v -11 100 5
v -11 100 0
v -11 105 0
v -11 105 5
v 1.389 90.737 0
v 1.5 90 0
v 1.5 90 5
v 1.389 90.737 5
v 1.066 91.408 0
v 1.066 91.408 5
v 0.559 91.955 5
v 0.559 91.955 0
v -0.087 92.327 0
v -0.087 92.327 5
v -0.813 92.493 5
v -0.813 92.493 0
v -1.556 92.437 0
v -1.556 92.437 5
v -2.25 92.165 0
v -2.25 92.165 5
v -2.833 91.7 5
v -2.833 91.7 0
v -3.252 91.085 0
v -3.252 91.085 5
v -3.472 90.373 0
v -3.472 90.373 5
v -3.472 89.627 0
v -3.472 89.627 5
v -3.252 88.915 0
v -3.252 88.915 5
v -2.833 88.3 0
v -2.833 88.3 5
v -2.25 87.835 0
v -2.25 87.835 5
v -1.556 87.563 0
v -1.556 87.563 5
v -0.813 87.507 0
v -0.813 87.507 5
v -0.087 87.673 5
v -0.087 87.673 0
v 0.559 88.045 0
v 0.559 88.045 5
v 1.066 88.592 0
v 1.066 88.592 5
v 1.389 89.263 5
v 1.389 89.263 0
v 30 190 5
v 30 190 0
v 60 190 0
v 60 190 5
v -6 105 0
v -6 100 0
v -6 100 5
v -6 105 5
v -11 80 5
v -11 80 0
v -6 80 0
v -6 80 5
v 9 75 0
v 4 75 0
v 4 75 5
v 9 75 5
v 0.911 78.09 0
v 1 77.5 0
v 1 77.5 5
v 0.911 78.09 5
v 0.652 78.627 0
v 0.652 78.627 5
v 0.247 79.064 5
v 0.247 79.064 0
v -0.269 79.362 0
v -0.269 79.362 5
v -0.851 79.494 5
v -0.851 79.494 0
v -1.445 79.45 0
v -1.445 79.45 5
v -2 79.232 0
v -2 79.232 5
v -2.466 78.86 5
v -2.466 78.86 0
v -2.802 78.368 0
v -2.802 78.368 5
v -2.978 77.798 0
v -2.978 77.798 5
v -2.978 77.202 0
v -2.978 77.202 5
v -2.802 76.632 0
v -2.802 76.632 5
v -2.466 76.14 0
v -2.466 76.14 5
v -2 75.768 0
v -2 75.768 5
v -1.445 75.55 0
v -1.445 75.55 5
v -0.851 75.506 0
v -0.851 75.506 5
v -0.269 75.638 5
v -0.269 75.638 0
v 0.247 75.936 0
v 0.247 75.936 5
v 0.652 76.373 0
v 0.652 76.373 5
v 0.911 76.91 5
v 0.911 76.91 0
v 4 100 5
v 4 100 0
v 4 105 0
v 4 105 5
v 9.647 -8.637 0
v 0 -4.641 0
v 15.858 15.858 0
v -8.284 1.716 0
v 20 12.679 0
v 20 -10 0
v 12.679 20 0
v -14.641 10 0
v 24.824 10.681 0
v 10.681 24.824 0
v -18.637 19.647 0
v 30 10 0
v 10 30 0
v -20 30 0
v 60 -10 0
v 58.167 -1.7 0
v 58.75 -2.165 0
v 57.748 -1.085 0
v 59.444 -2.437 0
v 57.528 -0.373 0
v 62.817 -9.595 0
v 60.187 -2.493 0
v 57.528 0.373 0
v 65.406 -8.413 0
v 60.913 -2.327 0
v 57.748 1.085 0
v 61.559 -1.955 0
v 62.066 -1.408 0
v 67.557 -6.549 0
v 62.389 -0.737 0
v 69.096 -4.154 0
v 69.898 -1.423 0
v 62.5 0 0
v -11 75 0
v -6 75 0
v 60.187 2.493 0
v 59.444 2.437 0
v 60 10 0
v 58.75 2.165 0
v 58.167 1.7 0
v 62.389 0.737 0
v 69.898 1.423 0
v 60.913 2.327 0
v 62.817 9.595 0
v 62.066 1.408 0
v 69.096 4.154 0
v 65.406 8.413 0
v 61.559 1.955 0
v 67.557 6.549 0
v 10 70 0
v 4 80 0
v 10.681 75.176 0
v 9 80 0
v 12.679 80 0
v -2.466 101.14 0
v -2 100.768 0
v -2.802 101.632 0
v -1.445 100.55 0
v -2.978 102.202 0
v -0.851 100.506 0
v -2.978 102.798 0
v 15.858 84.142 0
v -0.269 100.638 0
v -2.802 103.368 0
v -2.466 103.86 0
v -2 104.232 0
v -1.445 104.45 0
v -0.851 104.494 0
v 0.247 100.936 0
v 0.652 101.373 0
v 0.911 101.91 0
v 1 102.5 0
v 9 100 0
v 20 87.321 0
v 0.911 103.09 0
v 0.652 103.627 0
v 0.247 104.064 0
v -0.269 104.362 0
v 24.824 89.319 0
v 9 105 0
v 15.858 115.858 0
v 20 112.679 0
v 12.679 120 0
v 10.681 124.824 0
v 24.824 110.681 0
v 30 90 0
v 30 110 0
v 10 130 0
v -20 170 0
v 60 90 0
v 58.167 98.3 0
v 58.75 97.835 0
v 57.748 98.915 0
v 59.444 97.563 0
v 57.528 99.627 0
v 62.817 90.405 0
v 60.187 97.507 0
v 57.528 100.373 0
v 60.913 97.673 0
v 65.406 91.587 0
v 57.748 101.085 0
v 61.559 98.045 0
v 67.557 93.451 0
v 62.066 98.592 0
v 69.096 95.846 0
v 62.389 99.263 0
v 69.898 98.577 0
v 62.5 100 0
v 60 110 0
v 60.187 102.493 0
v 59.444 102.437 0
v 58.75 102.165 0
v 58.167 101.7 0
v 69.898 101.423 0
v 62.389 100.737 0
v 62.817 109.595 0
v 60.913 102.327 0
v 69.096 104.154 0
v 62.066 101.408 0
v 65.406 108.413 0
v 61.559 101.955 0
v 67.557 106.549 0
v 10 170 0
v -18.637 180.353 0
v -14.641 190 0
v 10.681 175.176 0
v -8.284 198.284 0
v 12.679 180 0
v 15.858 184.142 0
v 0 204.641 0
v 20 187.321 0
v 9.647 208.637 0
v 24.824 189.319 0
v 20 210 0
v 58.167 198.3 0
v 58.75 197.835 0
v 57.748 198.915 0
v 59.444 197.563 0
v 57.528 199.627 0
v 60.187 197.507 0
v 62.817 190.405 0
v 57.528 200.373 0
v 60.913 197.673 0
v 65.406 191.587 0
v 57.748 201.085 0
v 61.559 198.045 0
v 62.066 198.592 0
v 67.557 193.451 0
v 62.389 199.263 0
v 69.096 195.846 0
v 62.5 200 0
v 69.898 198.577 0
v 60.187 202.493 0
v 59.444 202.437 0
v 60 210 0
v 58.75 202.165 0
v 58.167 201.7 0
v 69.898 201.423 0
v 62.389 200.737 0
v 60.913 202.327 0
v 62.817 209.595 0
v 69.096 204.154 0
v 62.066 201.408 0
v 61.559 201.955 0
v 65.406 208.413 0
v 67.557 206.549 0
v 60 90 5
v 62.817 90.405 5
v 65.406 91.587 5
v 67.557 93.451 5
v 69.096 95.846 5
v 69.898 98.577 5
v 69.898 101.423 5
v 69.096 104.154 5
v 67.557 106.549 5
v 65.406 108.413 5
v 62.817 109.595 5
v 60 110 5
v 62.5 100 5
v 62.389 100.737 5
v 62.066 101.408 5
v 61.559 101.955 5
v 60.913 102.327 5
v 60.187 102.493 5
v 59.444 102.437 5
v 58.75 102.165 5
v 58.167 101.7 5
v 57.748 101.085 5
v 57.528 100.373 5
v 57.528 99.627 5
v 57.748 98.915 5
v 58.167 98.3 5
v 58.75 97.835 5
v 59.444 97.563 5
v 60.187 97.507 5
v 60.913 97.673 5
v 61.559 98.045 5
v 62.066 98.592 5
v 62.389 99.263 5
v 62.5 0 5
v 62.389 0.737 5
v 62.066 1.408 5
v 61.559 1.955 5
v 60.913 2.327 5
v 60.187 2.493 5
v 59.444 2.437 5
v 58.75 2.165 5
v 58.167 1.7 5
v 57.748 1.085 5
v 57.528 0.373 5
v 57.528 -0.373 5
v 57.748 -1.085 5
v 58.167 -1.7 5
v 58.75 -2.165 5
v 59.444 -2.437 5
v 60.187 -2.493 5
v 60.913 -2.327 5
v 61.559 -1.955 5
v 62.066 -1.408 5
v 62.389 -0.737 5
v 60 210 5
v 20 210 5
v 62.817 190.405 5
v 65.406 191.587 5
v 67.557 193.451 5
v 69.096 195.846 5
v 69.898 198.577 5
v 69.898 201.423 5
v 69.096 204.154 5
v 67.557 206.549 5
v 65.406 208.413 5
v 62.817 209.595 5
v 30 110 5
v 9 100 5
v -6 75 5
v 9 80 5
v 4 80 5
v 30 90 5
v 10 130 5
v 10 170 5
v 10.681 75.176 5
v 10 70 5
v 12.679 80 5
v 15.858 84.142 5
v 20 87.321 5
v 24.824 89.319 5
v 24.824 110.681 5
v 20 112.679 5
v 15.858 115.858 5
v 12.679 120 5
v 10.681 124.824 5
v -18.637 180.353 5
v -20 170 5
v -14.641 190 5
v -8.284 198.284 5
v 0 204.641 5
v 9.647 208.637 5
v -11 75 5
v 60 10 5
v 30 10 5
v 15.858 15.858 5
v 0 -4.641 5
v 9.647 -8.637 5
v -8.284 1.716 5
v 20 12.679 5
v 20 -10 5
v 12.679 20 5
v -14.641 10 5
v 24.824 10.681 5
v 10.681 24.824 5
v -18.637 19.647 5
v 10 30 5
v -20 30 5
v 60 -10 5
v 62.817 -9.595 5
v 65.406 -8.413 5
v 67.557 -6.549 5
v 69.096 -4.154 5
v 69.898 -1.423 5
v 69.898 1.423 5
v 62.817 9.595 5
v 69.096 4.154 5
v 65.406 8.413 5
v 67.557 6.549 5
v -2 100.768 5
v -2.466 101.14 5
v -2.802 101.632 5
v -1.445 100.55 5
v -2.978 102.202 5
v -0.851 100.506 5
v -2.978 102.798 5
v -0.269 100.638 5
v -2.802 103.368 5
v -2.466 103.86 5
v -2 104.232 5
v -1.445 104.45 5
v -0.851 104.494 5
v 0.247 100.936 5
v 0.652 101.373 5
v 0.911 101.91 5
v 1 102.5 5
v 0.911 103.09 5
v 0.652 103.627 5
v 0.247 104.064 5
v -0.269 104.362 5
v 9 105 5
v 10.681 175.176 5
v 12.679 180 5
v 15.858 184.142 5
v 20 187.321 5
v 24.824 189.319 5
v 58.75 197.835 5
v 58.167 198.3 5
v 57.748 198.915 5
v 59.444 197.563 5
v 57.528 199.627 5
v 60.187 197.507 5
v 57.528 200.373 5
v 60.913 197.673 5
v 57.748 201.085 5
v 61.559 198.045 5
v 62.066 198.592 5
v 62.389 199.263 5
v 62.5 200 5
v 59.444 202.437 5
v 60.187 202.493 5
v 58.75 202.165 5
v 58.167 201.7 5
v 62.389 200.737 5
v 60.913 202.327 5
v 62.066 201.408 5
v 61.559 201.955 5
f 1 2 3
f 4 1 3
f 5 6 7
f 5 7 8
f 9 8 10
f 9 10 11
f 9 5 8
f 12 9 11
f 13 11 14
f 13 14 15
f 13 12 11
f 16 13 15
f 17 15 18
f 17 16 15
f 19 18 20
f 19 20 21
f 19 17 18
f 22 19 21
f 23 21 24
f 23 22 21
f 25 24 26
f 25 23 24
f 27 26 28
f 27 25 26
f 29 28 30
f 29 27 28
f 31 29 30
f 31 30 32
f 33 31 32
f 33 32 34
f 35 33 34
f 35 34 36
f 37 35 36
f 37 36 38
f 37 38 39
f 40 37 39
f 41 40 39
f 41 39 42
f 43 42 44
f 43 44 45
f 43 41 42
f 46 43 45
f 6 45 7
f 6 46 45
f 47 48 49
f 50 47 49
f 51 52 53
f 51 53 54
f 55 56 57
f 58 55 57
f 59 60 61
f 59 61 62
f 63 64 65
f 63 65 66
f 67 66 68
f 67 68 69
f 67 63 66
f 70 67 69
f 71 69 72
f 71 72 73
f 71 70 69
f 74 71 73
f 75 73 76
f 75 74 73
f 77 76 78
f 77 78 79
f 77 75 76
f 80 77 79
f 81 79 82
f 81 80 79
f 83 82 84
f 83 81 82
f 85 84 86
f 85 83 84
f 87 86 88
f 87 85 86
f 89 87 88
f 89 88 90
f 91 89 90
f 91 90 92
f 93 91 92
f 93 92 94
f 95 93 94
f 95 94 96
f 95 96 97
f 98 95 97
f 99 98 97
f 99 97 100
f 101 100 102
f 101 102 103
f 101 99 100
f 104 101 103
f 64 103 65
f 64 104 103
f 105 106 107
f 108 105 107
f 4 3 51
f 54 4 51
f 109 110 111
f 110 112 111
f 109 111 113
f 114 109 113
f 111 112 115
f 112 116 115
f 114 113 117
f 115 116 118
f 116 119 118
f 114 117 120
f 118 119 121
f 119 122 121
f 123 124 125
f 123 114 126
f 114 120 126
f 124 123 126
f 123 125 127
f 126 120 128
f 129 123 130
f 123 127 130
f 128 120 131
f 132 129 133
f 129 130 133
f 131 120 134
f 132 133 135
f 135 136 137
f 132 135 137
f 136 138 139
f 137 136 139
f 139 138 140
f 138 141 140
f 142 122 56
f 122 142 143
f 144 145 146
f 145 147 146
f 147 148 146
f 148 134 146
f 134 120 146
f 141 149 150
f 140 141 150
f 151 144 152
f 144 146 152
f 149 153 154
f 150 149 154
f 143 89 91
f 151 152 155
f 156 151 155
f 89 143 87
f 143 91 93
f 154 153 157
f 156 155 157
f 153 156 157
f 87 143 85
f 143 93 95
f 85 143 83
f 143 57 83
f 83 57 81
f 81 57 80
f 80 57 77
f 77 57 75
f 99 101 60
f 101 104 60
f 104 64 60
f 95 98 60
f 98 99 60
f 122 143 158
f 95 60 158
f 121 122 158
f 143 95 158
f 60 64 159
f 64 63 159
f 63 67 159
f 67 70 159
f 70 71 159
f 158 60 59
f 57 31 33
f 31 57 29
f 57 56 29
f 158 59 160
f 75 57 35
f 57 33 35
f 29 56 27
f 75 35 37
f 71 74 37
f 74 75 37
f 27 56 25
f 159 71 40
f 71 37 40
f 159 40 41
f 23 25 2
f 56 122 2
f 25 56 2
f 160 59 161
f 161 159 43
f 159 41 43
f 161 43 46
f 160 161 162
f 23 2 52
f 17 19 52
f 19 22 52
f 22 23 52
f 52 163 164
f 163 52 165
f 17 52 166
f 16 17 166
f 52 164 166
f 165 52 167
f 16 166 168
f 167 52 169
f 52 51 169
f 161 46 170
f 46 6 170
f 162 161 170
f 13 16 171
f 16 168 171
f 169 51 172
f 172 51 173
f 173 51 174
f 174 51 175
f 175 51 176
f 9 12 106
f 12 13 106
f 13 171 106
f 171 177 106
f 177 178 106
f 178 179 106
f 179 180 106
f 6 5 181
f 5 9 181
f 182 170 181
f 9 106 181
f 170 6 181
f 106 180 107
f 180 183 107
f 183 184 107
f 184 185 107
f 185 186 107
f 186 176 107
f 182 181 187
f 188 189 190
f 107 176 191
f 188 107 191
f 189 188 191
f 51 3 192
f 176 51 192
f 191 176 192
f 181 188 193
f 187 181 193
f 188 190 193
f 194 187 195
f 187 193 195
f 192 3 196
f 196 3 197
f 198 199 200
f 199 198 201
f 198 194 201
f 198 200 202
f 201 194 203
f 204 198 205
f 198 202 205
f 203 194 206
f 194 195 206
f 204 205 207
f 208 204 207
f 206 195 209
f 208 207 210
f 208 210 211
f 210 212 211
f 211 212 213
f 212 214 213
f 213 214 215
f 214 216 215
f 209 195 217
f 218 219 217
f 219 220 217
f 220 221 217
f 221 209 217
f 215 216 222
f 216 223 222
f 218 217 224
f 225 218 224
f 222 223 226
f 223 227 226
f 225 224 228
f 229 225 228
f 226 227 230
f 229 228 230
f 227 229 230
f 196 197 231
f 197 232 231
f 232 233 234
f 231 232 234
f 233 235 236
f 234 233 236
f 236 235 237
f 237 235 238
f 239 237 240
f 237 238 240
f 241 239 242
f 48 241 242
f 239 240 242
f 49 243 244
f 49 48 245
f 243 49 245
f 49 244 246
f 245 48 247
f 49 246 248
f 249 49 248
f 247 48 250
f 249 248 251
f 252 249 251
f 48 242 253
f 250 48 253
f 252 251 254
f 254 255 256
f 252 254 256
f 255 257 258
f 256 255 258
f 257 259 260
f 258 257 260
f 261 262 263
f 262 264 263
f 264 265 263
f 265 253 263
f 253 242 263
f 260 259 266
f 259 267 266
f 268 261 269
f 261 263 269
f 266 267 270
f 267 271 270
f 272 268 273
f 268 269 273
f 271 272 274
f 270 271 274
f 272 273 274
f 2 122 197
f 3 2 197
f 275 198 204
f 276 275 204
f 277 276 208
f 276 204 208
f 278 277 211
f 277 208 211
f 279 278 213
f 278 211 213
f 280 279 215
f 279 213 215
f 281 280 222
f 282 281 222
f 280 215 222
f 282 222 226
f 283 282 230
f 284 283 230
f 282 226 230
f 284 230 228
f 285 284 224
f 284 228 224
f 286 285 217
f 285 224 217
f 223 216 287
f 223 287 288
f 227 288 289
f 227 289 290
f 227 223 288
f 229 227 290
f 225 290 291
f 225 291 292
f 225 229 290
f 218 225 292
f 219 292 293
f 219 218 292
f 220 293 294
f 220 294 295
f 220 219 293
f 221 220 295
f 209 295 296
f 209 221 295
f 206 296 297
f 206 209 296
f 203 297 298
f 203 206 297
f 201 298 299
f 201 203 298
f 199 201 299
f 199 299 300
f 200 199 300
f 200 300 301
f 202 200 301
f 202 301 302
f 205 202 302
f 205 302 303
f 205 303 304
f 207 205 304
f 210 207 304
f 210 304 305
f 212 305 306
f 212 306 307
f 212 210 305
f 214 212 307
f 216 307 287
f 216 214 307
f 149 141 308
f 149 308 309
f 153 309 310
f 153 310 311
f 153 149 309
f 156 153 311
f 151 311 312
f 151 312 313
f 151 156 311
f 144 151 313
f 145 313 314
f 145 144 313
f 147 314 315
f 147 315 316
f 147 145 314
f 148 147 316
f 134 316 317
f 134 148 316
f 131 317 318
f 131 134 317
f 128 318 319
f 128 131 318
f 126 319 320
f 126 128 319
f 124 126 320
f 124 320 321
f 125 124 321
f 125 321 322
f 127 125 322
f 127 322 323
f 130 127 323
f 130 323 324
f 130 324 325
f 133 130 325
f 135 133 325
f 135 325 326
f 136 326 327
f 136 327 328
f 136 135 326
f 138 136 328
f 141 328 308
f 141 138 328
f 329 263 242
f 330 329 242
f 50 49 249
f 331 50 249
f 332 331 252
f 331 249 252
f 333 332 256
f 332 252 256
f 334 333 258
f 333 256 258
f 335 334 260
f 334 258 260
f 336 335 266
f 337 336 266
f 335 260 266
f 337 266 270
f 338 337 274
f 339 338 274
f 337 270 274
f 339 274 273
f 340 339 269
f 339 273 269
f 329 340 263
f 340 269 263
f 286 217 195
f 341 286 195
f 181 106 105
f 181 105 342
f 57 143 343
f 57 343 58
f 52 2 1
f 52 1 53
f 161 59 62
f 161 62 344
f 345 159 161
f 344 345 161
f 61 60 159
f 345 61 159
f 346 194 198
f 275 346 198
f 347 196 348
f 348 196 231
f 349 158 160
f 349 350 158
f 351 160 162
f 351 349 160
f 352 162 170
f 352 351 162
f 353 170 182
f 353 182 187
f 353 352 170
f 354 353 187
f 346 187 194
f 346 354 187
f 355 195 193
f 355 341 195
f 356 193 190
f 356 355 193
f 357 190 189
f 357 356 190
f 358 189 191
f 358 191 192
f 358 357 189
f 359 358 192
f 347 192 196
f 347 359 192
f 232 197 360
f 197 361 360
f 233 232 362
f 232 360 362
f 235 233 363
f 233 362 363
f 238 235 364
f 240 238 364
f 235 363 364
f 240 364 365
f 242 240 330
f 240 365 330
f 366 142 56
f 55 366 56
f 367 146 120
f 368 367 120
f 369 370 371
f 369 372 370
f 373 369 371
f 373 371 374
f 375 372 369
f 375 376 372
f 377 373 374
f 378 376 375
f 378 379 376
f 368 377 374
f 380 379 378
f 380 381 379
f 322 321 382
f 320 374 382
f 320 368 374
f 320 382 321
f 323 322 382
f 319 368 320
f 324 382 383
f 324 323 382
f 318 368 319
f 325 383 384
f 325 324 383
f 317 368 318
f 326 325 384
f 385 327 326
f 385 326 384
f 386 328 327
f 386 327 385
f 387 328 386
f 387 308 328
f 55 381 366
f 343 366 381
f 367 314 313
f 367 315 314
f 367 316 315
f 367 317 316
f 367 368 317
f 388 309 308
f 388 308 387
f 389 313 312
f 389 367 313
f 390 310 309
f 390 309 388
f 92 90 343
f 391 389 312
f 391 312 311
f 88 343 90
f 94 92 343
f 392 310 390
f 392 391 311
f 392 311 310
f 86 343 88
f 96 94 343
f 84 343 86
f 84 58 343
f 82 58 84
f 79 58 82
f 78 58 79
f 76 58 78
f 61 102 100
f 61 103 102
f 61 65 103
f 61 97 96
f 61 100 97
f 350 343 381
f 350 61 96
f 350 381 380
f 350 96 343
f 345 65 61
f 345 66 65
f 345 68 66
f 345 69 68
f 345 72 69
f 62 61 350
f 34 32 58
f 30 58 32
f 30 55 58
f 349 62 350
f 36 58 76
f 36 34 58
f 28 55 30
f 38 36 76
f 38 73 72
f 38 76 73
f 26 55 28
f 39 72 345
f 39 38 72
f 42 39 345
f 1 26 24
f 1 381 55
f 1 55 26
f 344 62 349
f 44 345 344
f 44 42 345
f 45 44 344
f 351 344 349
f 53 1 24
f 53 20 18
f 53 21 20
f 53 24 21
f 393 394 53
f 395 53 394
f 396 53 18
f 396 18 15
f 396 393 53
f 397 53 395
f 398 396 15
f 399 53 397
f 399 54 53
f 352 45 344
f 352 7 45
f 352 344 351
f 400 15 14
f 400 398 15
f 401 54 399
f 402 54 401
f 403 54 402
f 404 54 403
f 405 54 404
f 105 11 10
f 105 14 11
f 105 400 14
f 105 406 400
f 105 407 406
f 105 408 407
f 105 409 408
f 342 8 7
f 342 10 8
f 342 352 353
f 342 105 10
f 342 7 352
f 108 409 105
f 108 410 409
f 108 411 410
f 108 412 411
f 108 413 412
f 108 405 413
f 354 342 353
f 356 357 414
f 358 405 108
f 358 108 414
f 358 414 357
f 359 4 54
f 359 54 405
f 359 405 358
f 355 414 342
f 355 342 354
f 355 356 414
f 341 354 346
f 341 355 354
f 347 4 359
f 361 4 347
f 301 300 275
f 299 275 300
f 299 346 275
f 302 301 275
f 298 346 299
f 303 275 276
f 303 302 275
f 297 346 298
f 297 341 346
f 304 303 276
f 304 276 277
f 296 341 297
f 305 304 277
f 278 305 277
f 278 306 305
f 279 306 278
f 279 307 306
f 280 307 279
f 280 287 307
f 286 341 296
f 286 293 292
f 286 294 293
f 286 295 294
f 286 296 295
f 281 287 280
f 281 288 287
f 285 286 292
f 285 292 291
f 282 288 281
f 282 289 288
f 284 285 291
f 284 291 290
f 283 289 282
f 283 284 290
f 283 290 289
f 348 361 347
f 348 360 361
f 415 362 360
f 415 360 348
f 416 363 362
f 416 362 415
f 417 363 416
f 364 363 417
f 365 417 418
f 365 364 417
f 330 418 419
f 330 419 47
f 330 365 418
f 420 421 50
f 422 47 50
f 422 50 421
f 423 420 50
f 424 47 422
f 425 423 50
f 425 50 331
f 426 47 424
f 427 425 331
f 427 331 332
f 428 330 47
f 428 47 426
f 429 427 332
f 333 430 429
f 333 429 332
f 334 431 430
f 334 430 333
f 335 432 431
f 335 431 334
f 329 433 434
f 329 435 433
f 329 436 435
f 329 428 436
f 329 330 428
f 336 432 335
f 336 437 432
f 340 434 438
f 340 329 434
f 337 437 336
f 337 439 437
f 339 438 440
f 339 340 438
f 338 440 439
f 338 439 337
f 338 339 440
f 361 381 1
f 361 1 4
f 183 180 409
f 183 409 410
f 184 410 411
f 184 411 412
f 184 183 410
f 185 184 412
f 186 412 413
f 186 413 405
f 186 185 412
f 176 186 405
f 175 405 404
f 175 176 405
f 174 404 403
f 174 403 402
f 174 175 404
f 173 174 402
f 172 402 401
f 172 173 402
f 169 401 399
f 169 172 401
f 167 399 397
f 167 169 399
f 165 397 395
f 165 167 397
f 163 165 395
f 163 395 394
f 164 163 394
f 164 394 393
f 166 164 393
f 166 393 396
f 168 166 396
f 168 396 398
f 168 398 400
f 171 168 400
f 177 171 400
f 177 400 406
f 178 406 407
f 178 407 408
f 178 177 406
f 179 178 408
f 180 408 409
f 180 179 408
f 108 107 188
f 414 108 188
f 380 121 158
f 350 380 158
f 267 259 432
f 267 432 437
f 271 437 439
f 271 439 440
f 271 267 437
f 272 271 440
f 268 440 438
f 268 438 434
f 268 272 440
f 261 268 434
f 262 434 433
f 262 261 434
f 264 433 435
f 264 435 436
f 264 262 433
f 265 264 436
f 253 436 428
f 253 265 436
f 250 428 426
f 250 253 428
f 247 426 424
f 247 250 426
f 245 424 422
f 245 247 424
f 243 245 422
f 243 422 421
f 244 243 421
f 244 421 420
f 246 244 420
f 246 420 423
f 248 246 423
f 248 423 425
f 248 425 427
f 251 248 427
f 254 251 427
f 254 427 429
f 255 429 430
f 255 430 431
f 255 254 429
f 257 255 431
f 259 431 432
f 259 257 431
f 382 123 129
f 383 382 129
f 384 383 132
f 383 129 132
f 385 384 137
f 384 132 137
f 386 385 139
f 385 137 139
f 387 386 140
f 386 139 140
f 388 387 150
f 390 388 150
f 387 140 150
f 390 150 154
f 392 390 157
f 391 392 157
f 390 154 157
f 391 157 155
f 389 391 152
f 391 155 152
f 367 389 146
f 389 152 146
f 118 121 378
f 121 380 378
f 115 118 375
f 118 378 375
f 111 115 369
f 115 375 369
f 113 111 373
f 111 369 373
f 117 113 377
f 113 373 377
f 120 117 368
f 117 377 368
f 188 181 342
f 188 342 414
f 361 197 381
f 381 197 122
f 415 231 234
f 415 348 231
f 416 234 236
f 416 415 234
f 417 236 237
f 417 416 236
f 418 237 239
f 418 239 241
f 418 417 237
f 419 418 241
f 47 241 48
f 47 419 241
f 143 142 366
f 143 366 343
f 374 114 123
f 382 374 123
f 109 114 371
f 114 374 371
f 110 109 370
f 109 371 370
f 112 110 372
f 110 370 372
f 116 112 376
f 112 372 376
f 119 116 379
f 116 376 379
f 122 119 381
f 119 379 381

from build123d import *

# Parameters (mm, degrees)
BOSS_EXTRU_1_OUTLINE_W   = 5
BOSS_EXTRU_1_OUTLINE_H   = 5
BOSS_EXTRU_1_OUTLINE_R   = 2
BOSS_EXTRU_1_OUTLINE_R_2 = 2.5
BOSS_EXTRU_1_DEPTH       = 5
CONG_1_R                 = 20
CONG_2_R                 = 40


# Read off the part's stored shape, not the designer's step: Boss.-Extru.1
with BuildPart() as part:
    # Boss.-Extru.1 outline → Boss.-Extru.1 (new body)
    with BuildSketch(Plane.XY):
        with BuildLine():
            Line((10, 10), (10, 90))
            Line((10, 90), (60, 90))
            ThreePointArc((60, 90), (70, 100), (60, 110))
            Line((60, 110), (10, 110))
            Line((10, 110), (10, 190))
            Line((10, 190), (60, 190))
            ThreePointArc((60, 190), (70, 200), (60, 210))
            Line((60, 210), (-20, 210))
            Line((-20, 210), (-20, -10))
            Line((-20, -10), (60, -10))
            ThreePointArc((60, -10), (70, 0), (60, 10))
            Line((60, 10), (10, 10))
        make_face()
        with Locations((-8.5, 77.5)):
            Rectangle(BOSS_EXTRU_1_OUTLINE_W, BOSS_EXTRU_1_OUTLINE_H, mode=Mode.SUBTRACT)
        with Locations((-1, 77.5)):
            Circle(BOSS_EXTRU_1_OUTLINE_R, mode=Mode.SUBTRACT)
        with Locations((-1, 90)):
            Circle(BOSS_EXTRU_1_OUTLINE_R_2, mode=Mode.SUBTRACT)
        with Locations((6.5, 77.5)):
            Rectangle(BOSS_EXTRU_1_OUTLINE_W, BOSS_EXTRU_1_OUTLINE_H, mode=Mode.SUBTRACT)
        with Locations((60, 0)):
            Circle(BOSS_EXTRU_1_OUTLINE_R_2, mode=Mode.SUBTRACT)
        with Locations((-8.5, 102.5)):
            Rectangle(BOSS_EXTRU_1_OUTLINE_W, BOSS_EXTRU_1_OUTLINE_H, mode=Mode.SUBTRACT)
        with Locations((-1, 102.5)):
            Circle(BOSS_EXTRU_1_OUTLINE_R, mode=Mode.SUBTRACT)
        with Locations((6.5, 102.5)):
            Rectangle(BOSS_EXTRU_1_OUTLINE_W, BOSS_EXTRU_1_OUTLINE_H, mode=Mode.SUBTRACT)
        with Locations((60, 100)):
            Circle(BOSS_EXTRU_1_OUTLINE_R_2, mode=Mode.SUBTRACT)
        with Locations((60, 200)):
            Circle(BOSS_EXTRU_1_OUTLINE_R_2, mode=Mode.SUBTRACT)
    extrude(amount=BOSS_EXTRU_1_DEPTH)

    # Congé1
    cong_1_edges = [part.edges().sort_by_distance(p)[0] for p in [
        (10, 10, 2.5),
        (10, 190, 2.5),
        (10, 110, 2.5),
        (10, 90, 2.5),
    ]]
    fillet(cong_1_edges, radius=CONG_1_R)

    # Congé2
    cong_2_edges = [part.edges().sort_by_distance(p)[0] for p in [
        (-20, -10, 2.5),
        (-20, 210, 2.5),
    ]]
    fillet(cong_2_edges, radius=CONG_2_R)


solid = part.part
